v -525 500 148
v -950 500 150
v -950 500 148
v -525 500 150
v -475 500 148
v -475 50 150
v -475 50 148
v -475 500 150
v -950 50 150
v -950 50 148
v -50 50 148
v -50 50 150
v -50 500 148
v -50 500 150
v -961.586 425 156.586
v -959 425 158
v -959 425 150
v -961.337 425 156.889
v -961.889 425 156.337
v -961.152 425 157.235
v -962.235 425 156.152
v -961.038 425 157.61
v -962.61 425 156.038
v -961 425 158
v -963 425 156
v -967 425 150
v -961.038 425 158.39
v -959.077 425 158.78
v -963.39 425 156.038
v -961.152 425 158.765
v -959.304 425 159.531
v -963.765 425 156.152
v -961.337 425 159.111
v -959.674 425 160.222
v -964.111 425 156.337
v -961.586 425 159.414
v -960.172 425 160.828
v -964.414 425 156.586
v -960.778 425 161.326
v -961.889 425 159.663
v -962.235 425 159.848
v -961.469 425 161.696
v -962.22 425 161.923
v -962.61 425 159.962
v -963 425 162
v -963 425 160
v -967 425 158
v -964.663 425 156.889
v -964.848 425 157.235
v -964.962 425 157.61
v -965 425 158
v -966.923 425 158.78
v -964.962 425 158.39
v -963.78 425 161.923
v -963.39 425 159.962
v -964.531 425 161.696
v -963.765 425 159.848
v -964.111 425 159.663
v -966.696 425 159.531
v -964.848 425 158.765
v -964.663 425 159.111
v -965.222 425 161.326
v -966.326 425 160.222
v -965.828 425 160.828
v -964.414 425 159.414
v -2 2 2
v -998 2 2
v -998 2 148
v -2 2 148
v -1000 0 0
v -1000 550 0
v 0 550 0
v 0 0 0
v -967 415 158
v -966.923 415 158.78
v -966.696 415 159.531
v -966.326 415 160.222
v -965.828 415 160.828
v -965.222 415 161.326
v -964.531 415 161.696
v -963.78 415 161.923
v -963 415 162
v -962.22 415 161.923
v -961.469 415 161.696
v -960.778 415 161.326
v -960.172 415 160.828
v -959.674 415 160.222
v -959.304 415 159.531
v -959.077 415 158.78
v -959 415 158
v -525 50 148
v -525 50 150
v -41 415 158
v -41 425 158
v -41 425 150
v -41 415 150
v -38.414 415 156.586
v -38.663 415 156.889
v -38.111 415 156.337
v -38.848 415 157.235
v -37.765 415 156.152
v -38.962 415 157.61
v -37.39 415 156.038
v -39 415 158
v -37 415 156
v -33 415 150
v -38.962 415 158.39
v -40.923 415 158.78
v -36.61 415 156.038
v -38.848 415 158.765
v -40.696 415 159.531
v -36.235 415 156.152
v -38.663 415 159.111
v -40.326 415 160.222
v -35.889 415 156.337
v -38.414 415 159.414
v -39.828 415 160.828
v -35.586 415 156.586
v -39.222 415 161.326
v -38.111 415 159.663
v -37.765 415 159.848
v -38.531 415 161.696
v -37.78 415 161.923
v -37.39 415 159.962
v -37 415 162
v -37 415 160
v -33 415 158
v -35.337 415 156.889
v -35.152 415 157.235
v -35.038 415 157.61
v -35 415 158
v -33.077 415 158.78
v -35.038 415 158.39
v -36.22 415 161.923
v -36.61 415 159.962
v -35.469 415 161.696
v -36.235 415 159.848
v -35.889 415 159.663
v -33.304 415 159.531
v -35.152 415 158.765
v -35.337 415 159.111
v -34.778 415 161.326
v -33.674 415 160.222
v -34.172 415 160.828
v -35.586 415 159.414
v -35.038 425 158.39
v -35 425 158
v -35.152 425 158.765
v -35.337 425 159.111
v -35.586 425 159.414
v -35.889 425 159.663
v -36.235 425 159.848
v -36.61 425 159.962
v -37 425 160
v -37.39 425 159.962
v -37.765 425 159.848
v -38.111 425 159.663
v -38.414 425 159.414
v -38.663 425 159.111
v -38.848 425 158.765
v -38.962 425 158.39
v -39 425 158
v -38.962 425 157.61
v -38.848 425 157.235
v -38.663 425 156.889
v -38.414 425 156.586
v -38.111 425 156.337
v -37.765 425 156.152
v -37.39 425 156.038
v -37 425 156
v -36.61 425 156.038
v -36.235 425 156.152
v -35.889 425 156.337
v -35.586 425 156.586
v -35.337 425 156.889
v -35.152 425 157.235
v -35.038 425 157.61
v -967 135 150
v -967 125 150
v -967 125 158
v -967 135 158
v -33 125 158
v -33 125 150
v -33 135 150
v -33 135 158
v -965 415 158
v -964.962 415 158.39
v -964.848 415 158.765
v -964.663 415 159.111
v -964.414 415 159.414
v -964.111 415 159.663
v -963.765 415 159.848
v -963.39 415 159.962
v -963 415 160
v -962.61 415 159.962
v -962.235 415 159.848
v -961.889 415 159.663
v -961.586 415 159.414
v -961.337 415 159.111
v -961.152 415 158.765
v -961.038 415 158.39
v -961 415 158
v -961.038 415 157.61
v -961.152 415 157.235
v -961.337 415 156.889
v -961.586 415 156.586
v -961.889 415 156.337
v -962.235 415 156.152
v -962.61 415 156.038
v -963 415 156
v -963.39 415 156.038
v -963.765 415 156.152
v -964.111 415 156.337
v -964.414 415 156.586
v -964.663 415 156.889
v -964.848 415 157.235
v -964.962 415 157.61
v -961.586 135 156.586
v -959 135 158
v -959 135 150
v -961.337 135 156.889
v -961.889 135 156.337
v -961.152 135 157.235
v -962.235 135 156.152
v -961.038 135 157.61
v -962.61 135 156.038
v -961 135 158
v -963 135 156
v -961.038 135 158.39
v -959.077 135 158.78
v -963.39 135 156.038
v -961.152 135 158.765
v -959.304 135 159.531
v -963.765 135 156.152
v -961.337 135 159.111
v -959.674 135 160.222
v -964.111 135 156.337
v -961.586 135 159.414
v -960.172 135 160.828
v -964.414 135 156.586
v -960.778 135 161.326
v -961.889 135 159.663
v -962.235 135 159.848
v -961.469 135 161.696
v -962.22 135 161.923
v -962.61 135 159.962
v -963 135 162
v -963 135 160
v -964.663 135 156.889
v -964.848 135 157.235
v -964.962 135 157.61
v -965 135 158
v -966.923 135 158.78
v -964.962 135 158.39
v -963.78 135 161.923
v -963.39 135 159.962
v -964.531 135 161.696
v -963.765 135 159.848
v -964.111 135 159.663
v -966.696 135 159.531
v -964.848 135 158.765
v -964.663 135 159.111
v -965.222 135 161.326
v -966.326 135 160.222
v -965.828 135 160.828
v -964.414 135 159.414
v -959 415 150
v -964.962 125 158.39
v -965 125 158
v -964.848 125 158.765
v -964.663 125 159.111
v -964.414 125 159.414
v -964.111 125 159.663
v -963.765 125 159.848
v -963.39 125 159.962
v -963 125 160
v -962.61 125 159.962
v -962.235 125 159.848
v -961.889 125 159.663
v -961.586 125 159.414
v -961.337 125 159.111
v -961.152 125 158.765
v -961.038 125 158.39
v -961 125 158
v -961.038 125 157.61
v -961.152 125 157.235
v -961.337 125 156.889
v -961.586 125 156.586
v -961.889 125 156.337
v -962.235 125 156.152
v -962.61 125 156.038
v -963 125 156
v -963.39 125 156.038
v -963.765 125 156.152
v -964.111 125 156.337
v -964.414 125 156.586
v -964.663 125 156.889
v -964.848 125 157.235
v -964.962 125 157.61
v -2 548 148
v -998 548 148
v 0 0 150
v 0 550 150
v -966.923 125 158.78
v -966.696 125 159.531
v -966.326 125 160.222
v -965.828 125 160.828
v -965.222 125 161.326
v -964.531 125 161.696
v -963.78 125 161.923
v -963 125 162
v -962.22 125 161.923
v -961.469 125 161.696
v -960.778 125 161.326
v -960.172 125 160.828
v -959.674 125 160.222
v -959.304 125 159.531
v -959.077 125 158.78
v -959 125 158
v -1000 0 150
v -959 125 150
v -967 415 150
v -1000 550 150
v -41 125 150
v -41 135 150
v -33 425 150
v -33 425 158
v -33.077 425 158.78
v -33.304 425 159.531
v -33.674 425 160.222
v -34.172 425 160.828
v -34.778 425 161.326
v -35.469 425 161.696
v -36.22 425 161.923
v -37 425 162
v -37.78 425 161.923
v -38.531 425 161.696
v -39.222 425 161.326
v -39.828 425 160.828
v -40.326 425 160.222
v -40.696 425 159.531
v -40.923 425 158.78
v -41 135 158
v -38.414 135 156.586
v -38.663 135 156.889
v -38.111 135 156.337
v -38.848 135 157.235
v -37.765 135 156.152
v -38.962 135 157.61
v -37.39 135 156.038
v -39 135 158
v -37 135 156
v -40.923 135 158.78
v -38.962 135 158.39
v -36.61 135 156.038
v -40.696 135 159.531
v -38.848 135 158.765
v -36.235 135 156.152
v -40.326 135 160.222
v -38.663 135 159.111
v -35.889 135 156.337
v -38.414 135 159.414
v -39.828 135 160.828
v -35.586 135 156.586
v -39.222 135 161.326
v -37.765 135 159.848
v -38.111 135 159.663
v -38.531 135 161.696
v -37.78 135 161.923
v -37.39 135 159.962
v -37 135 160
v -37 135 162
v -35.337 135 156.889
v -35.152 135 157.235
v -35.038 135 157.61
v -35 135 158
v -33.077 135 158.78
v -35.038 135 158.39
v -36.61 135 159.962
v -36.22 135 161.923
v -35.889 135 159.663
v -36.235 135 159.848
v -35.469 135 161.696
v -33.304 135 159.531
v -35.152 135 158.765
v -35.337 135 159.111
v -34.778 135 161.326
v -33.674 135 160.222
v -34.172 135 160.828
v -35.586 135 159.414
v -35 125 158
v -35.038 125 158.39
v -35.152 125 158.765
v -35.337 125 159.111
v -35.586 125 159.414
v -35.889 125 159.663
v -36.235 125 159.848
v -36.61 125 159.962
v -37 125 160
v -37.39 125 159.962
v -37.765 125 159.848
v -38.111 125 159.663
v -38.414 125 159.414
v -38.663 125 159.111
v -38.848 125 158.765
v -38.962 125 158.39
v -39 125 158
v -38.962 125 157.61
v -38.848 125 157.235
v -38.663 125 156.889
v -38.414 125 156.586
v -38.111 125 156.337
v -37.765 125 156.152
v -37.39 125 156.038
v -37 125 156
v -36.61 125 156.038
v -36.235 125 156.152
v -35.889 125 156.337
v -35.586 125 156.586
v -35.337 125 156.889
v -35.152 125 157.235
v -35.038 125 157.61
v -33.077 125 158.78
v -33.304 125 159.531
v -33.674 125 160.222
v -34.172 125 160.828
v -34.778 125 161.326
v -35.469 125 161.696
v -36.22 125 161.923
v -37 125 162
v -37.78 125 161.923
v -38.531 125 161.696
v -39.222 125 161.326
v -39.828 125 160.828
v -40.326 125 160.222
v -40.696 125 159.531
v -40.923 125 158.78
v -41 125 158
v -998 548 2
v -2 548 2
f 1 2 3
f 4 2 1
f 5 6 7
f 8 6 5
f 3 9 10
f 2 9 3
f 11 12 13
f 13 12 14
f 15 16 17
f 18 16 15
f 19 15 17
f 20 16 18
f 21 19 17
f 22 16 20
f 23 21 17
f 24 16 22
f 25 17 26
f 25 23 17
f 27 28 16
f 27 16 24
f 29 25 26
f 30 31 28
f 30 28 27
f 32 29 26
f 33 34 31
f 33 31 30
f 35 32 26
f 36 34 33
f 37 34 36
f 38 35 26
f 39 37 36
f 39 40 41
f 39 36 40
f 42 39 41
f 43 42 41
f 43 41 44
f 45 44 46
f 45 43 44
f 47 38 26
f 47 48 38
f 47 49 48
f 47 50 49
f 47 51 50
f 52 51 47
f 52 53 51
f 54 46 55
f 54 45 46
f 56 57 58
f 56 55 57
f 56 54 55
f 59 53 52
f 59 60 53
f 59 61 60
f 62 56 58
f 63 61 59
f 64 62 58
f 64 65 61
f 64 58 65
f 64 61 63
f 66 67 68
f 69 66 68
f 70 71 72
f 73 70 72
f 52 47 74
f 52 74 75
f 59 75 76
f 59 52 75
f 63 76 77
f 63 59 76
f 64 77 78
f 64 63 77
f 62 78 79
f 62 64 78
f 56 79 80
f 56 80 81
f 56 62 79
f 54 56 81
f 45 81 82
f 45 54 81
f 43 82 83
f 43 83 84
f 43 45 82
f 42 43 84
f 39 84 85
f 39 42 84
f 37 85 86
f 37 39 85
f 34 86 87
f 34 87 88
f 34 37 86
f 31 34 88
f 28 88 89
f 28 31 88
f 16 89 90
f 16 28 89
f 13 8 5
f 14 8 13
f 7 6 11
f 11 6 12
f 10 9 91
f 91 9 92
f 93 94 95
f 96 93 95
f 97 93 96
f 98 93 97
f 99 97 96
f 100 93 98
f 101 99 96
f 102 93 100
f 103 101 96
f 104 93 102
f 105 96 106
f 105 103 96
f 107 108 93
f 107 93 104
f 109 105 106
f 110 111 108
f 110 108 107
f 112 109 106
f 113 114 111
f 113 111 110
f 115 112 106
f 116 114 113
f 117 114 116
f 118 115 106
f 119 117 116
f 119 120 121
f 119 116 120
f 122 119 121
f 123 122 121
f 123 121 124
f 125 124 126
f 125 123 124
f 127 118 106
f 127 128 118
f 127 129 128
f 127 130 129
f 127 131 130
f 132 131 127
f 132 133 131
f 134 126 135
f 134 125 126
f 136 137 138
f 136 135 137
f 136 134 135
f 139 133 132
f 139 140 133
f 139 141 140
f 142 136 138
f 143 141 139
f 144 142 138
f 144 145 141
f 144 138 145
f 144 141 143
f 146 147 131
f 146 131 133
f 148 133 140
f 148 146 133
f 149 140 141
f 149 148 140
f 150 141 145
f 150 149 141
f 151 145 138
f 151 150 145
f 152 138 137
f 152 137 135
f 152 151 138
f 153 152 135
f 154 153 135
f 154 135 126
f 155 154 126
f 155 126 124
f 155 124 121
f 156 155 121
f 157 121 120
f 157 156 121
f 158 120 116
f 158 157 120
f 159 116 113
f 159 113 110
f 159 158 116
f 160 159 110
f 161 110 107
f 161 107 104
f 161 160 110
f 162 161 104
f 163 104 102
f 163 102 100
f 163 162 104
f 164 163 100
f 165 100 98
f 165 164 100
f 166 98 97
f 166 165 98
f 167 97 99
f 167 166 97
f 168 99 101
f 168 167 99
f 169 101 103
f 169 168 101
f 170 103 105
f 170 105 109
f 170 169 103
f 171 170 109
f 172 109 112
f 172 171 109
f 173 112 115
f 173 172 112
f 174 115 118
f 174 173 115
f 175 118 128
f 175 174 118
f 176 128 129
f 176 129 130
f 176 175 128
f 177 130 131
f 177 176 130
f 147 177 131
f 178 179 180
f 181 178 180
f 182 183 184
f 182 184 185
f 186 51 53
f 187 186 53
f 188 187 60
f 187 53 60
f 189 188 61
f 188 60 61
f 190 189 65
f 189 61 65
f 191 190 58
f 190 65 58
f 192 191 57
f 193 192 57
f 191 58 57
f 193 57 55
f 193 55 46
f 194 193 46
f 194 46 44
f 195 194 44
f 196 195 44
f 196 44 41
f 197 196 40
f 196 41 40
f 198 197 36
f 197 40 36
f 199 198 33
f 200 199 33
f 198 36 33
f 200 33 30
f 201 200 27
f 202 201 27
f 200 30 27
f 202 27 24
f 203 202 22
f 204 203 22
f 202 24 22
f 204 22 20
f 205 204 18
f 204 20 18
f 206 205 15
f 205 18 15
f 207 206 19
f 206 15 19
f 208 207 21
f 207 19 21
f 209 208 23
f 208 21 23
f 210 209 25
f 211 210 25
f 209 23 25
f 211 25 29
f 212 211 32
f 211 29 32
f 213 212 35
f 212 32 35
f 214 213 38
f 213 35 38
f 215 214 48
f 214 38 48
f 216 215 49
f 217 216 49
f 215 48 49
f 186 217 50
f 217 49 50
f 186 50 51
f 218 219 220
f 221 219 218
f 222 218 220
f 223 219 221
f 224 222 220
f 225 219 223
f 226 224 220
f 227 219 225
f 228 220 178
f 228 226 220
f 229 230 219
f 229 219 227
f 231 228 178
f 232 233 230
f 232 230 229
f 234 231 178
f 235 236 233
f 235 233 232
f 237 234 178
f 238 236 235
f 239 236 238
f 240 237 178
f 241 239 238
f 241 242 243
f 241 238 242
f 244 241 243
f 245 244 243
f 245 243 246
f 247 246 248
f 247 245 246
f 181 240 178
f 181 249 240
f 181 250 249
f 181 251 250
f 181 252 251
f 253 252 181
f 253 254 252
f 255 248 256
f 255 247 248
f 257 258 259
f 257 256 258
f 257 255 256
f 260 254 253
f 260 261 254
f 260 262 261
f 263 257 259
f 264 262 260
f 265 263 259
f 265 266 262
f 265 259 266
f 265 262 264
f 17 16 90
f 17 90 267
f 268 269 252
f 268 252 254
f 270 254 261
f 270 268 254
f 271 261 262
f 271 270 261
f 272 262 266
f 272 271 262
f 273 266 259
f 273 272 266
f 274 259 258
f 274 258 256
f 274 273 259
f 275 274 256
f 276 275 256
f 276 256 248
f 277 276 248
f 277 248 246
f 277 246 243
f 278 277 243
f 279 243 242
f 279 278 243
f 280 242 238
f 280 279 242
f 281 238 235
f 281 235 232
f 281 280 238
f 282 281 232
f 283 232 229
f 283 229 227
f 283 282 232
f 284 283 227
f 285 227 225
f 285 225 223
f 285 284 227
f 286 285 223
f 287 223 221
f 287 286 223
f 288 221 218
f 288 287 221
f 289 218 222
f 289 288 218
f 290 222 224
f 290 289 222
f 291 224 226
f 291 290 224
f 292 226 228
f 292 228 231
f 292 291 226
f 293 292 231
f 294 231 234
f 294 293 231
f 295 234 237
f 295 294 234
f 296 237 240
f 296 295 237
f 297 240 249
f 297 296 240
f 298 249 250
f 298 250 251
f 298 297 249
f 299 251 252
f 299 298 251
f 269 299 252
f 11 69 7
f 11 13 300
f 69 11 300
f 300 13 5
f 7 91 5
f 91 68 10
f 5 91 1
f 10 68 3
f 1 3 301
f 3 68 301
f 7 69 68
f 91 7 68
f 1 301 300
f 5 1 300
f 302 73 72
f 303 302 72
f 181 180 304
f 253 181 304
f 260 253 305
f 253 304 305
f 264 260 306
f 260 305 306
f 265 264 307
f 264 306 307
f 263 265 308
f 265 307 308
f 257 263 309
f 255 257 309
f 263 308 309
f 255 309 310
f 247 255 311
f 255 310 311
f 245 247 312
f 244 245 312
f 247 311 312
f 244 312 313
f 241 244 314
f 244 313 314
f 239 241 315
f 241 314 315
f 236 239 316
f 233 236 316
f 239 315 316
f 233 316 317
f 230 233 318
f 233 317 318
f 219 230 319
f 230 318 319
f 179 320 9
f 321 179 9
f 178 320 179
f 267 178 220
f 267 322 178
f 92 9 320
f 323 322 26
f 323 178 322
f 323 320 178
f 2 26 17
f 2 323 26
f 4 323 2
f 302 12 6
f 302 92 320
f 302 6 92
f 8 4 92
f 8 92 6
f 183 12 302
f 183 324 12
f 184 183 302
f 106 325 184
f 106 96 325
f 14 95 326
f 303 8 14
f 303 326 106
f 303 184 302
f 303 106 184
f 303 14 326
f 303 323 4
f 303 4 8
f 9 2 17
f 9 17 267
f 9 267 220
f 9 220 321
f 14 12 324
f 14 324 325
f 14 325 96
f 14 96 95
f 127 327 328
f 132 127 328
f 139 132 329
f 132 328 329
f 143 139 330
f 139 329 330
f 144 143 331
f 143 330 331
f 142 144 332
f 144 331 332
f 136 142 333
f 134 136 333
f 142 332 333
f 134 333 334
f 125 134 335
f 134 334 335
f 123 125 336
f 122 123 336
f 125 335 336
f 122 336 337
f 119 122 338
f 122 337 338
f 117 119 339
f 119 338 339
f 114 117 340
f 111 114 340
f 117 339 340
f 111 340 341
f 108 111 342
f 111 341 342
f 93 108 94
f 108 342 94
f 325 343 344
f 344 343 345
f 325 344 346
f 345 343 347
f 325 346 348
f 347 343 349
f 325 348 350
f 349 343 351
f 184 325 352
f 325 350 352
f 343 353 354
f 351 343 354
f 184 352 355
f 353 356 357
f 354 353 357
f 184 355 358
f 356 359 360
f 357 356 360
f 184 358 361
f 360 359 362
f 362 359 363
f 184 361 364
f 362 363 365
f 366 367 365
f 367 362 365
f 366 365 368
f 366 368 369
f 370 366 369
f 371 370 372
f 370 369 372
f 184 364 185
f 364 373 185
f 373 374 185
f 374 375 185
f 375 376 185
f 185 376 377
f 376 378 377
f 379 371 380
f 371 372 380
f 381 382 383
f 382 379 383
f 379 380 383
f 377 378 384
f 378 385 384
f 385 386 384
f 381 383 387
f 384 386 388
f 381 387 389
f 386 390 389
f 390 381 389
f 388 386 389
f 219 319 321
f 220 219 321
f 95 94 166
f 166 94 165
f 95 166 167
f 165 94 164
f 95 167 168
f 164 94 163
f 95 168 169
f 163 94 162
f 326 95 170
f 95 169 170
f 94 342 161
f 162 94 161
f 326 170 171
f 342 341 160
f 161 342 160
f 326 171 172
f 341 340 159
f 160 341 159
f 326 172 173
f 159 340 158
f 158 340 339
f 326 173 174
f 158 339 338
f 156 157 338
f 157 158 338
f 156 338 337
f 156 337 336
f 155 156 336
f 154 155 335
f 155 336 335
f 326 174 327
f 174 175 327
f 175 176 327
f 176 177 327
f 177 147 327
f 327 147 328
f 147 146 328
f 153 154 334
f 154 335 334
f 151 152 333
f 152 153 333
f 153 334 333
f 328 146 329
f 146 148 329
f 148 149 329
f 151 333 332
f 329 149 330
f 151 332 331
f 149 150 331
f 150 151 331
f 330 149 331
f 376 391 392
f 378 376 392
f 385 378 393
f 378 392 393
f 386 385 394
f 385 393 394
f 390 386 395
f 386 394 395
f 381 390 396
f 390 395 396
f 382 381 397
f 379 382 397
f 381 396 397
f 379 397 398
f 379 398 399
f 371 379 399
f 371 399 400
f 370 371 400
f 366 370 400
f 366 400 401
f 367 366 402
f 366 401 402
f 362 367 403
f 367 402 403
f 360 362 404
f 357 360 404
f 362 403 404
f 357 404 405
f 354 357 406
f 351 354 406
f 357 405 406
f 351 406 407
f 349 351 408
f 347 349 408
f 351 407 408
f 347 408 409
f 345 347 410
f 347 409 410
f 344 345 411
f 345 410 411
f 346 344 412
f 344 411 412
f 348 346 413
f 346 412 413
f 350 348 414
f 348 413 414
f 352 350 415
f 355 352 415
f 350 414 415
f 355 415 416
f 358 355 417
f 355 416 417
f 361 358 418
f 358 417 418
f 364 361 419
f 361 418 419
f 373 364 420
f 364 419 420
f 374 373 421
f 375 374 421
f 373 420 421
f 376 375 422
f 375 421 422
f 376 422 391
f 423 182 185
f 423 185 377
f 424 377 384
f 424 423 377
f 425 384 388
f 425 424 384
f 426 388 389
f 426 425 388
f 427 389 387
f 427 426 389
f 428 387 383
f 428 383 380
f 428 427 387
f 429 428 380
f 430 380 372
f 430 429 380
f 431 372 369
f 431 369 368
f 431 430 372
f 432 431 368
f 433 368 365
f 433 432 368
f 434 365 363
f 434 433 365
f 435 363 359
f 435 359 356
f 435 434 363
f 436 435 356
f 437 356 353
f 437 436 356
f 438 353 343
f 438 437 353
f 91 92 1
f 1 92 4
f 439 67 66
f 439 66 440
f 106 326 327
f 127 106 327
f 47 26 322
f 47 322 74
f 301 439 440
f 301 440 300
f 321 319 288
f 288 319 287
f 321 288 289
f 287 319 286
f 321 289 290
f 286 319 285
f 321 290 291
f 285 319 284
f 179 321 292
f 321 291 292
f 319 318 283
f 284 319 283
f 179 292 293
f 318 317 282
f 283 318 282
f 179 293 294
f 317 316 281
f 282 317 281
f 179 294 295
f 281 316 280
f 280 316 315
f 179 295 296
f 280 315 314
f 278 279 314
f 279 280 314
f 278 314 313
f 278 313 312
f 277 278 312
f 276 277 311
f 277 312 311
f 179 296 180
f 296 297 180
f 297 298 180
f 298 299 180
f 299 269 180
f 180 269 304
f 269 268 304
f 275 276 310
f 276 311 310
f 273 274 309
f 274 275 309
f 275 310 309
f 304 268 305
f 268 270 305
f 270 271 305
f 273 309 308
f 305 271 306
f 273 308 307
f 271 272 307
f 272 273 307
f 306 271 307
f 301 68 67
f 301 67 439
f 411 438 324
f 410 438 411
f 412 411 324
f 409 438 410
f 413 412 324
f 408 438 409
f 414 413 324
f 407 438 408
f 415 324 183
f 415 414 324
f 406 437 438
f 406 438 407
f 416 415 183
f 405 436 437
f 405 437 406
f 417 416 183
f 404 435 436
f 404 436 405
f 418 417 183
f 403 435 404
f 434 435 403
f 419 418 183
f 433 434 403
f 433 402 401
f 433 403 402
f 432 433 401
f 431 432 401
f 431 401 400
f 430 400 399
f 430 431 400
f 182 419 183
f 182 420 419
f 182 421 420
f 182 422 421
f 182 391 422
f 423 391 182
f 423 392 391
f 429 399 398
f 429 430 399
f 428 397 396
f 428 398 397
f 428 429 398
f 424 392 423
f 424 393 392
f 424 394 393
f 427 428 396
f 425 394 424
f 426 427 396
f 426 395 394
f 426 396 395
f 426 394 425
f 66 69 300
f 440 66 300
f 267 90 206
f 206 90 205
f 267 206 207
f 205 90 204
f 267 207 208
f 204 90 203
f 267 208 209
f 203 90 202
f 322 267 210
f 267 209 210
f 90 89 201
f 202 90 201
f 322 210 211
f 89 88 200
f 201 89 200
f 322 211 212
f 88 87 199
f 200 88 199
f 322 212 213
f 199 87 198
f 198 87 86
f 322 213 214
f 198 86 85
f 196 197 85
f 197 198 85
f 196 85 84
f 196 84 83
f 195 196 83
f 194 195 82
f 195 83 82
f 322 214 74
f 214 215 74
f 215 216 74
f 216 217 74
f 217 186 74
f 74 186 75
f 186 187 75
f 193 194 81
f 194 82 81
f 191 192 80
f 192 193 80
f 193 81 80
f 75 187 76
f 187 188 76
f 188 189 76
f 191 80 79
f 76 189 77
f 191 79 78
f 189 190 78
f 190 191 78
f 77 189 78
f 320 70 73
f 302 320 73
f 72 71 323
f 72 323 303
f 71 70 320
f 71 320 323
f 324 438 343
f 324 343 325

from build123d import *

# Parameters (mm, degrees)
SKETCH1_W               = 1000
SKETCH1_H               = 550
BASE_EXTRUDE_DEPTH      = 150
SKETCH2_W               = 900
SKETCH2_H               = 450
CUT_EXTRUDE1_DEPTH      = 148
SHELL3_START            = -998
SHELL3_OUTLINE_W        = 546
SHELL3_OUTLINE_H        = 146
SHELL3_DEPTH            = 996
SKETCH3_W               = 50
SKETCH3_H               = 450
BOSS_EXTRUDE1_DEPTH     = 2
SKETCH4_R               = 2
BOSS_EXTRUDE2_DEPTH     = 10
MIRROR2_COPY_1_SKETCH_R = 2
MIRROR2_COPY_1_DEPTH    = 10


# Read off the part's stored shape, not the designer's step: Shell3
with BuildPart() as part:
    # Sketch1 → Base-Extrude (new body)
    with BuildSketch(Plane.XY):
        with Locations((-500, 275)):
            Rectangle(SKETCH1_W, SKETCH1_H)
    extrude(amount=BASE_EXTRUDE_DEPTH)

    # Sketch2 → Cut-Extrude1 (cut)
    with BuildSketch(Plane.XY.offset(150)):
        with Locations((-500, 275)):
            Rectangle(SKETCH2_W, SKETCH2_H)
    extrude(amount=-CUT_EXTRUDE1_DEPTH, mode=Mode.SUBTRACT)

    # Shell3 outline → Shell3 (cut)
    with BuildSketch(Plane.YZ.offset(SHELL3_START)):
        with Locations((275, 75)):
            Rectangle(SHELL3_OUTLINE_W, SHELL3_OUTLINE_H)
    extrude(amount=SHELL3_DEPTH, mode=Mode.SUBTRACT)

    # Sketch3 → Boss-Extrude1 (add)
    with BuildSketch(Plane.XY.offset(150)):
        with Locations((-500, 275)):
            Rectangle(SKETCH3_W, SKETCH3_H)
    extrude(amount=-BOSS_EXTRUDE1_DEPTH)

    # Sketch4 → Boss-Extrude2 (add)
    with BuildSketch(Plane.XZ.offset(-125)):
        with BuildLine():
            Line((-41, 150), (-33, 150))
            Line((-33, 150), (-33, 158))
            ThreePointArc((-33, 158), (-37, 162), (-41, 158))
            Line((-41, 158), (-41, 150))
        make_face()
        with Locations((-37, 158)):
            Circle(SKETCH4_R, mode=Mode.SUBTRACT)
    boss_extrude2 = extrude(amount=-BOSS_EXTRUDE2_DEPTH)

    # Mirror1: Boss-Extrude2 across plane
    add(boss_extrude2.mirror(Plane.ZY.offset(500)))

    # Mirror2: Boss-Extrude2 across plane
    add(boss_extrude2.mirror(Plane(origin=(0, 275, 0), x_dir=(0, 0, 1), z_dir=(0, -1, 0))))

    # Mirror2 copy 1 sketch → Mirror2 copy 1 (add)
    with BuildSketch(Plane(origin=(-1000, 425, 0), x_dir=(-1, 0, 0), z_dir=(0, 1, 0))):
        with BuildLine():
            Line((-41, 150), (-33, 150))
            Line((-33, 150), (-33, 158))
            ThreePointArc((-33, 158), (-37, 162), (-41, 158))
            Line((-41, 158), (-41, 150))
        make_face()
        with Locations((-37, 158)):
            Circle(MIRROR2_COPY_1_SKETCH_R, mode=Mode.SUBTRACT)
    extrude(amount=-MIRROR2_COPY_1_DEPTH)


solid = part.part
